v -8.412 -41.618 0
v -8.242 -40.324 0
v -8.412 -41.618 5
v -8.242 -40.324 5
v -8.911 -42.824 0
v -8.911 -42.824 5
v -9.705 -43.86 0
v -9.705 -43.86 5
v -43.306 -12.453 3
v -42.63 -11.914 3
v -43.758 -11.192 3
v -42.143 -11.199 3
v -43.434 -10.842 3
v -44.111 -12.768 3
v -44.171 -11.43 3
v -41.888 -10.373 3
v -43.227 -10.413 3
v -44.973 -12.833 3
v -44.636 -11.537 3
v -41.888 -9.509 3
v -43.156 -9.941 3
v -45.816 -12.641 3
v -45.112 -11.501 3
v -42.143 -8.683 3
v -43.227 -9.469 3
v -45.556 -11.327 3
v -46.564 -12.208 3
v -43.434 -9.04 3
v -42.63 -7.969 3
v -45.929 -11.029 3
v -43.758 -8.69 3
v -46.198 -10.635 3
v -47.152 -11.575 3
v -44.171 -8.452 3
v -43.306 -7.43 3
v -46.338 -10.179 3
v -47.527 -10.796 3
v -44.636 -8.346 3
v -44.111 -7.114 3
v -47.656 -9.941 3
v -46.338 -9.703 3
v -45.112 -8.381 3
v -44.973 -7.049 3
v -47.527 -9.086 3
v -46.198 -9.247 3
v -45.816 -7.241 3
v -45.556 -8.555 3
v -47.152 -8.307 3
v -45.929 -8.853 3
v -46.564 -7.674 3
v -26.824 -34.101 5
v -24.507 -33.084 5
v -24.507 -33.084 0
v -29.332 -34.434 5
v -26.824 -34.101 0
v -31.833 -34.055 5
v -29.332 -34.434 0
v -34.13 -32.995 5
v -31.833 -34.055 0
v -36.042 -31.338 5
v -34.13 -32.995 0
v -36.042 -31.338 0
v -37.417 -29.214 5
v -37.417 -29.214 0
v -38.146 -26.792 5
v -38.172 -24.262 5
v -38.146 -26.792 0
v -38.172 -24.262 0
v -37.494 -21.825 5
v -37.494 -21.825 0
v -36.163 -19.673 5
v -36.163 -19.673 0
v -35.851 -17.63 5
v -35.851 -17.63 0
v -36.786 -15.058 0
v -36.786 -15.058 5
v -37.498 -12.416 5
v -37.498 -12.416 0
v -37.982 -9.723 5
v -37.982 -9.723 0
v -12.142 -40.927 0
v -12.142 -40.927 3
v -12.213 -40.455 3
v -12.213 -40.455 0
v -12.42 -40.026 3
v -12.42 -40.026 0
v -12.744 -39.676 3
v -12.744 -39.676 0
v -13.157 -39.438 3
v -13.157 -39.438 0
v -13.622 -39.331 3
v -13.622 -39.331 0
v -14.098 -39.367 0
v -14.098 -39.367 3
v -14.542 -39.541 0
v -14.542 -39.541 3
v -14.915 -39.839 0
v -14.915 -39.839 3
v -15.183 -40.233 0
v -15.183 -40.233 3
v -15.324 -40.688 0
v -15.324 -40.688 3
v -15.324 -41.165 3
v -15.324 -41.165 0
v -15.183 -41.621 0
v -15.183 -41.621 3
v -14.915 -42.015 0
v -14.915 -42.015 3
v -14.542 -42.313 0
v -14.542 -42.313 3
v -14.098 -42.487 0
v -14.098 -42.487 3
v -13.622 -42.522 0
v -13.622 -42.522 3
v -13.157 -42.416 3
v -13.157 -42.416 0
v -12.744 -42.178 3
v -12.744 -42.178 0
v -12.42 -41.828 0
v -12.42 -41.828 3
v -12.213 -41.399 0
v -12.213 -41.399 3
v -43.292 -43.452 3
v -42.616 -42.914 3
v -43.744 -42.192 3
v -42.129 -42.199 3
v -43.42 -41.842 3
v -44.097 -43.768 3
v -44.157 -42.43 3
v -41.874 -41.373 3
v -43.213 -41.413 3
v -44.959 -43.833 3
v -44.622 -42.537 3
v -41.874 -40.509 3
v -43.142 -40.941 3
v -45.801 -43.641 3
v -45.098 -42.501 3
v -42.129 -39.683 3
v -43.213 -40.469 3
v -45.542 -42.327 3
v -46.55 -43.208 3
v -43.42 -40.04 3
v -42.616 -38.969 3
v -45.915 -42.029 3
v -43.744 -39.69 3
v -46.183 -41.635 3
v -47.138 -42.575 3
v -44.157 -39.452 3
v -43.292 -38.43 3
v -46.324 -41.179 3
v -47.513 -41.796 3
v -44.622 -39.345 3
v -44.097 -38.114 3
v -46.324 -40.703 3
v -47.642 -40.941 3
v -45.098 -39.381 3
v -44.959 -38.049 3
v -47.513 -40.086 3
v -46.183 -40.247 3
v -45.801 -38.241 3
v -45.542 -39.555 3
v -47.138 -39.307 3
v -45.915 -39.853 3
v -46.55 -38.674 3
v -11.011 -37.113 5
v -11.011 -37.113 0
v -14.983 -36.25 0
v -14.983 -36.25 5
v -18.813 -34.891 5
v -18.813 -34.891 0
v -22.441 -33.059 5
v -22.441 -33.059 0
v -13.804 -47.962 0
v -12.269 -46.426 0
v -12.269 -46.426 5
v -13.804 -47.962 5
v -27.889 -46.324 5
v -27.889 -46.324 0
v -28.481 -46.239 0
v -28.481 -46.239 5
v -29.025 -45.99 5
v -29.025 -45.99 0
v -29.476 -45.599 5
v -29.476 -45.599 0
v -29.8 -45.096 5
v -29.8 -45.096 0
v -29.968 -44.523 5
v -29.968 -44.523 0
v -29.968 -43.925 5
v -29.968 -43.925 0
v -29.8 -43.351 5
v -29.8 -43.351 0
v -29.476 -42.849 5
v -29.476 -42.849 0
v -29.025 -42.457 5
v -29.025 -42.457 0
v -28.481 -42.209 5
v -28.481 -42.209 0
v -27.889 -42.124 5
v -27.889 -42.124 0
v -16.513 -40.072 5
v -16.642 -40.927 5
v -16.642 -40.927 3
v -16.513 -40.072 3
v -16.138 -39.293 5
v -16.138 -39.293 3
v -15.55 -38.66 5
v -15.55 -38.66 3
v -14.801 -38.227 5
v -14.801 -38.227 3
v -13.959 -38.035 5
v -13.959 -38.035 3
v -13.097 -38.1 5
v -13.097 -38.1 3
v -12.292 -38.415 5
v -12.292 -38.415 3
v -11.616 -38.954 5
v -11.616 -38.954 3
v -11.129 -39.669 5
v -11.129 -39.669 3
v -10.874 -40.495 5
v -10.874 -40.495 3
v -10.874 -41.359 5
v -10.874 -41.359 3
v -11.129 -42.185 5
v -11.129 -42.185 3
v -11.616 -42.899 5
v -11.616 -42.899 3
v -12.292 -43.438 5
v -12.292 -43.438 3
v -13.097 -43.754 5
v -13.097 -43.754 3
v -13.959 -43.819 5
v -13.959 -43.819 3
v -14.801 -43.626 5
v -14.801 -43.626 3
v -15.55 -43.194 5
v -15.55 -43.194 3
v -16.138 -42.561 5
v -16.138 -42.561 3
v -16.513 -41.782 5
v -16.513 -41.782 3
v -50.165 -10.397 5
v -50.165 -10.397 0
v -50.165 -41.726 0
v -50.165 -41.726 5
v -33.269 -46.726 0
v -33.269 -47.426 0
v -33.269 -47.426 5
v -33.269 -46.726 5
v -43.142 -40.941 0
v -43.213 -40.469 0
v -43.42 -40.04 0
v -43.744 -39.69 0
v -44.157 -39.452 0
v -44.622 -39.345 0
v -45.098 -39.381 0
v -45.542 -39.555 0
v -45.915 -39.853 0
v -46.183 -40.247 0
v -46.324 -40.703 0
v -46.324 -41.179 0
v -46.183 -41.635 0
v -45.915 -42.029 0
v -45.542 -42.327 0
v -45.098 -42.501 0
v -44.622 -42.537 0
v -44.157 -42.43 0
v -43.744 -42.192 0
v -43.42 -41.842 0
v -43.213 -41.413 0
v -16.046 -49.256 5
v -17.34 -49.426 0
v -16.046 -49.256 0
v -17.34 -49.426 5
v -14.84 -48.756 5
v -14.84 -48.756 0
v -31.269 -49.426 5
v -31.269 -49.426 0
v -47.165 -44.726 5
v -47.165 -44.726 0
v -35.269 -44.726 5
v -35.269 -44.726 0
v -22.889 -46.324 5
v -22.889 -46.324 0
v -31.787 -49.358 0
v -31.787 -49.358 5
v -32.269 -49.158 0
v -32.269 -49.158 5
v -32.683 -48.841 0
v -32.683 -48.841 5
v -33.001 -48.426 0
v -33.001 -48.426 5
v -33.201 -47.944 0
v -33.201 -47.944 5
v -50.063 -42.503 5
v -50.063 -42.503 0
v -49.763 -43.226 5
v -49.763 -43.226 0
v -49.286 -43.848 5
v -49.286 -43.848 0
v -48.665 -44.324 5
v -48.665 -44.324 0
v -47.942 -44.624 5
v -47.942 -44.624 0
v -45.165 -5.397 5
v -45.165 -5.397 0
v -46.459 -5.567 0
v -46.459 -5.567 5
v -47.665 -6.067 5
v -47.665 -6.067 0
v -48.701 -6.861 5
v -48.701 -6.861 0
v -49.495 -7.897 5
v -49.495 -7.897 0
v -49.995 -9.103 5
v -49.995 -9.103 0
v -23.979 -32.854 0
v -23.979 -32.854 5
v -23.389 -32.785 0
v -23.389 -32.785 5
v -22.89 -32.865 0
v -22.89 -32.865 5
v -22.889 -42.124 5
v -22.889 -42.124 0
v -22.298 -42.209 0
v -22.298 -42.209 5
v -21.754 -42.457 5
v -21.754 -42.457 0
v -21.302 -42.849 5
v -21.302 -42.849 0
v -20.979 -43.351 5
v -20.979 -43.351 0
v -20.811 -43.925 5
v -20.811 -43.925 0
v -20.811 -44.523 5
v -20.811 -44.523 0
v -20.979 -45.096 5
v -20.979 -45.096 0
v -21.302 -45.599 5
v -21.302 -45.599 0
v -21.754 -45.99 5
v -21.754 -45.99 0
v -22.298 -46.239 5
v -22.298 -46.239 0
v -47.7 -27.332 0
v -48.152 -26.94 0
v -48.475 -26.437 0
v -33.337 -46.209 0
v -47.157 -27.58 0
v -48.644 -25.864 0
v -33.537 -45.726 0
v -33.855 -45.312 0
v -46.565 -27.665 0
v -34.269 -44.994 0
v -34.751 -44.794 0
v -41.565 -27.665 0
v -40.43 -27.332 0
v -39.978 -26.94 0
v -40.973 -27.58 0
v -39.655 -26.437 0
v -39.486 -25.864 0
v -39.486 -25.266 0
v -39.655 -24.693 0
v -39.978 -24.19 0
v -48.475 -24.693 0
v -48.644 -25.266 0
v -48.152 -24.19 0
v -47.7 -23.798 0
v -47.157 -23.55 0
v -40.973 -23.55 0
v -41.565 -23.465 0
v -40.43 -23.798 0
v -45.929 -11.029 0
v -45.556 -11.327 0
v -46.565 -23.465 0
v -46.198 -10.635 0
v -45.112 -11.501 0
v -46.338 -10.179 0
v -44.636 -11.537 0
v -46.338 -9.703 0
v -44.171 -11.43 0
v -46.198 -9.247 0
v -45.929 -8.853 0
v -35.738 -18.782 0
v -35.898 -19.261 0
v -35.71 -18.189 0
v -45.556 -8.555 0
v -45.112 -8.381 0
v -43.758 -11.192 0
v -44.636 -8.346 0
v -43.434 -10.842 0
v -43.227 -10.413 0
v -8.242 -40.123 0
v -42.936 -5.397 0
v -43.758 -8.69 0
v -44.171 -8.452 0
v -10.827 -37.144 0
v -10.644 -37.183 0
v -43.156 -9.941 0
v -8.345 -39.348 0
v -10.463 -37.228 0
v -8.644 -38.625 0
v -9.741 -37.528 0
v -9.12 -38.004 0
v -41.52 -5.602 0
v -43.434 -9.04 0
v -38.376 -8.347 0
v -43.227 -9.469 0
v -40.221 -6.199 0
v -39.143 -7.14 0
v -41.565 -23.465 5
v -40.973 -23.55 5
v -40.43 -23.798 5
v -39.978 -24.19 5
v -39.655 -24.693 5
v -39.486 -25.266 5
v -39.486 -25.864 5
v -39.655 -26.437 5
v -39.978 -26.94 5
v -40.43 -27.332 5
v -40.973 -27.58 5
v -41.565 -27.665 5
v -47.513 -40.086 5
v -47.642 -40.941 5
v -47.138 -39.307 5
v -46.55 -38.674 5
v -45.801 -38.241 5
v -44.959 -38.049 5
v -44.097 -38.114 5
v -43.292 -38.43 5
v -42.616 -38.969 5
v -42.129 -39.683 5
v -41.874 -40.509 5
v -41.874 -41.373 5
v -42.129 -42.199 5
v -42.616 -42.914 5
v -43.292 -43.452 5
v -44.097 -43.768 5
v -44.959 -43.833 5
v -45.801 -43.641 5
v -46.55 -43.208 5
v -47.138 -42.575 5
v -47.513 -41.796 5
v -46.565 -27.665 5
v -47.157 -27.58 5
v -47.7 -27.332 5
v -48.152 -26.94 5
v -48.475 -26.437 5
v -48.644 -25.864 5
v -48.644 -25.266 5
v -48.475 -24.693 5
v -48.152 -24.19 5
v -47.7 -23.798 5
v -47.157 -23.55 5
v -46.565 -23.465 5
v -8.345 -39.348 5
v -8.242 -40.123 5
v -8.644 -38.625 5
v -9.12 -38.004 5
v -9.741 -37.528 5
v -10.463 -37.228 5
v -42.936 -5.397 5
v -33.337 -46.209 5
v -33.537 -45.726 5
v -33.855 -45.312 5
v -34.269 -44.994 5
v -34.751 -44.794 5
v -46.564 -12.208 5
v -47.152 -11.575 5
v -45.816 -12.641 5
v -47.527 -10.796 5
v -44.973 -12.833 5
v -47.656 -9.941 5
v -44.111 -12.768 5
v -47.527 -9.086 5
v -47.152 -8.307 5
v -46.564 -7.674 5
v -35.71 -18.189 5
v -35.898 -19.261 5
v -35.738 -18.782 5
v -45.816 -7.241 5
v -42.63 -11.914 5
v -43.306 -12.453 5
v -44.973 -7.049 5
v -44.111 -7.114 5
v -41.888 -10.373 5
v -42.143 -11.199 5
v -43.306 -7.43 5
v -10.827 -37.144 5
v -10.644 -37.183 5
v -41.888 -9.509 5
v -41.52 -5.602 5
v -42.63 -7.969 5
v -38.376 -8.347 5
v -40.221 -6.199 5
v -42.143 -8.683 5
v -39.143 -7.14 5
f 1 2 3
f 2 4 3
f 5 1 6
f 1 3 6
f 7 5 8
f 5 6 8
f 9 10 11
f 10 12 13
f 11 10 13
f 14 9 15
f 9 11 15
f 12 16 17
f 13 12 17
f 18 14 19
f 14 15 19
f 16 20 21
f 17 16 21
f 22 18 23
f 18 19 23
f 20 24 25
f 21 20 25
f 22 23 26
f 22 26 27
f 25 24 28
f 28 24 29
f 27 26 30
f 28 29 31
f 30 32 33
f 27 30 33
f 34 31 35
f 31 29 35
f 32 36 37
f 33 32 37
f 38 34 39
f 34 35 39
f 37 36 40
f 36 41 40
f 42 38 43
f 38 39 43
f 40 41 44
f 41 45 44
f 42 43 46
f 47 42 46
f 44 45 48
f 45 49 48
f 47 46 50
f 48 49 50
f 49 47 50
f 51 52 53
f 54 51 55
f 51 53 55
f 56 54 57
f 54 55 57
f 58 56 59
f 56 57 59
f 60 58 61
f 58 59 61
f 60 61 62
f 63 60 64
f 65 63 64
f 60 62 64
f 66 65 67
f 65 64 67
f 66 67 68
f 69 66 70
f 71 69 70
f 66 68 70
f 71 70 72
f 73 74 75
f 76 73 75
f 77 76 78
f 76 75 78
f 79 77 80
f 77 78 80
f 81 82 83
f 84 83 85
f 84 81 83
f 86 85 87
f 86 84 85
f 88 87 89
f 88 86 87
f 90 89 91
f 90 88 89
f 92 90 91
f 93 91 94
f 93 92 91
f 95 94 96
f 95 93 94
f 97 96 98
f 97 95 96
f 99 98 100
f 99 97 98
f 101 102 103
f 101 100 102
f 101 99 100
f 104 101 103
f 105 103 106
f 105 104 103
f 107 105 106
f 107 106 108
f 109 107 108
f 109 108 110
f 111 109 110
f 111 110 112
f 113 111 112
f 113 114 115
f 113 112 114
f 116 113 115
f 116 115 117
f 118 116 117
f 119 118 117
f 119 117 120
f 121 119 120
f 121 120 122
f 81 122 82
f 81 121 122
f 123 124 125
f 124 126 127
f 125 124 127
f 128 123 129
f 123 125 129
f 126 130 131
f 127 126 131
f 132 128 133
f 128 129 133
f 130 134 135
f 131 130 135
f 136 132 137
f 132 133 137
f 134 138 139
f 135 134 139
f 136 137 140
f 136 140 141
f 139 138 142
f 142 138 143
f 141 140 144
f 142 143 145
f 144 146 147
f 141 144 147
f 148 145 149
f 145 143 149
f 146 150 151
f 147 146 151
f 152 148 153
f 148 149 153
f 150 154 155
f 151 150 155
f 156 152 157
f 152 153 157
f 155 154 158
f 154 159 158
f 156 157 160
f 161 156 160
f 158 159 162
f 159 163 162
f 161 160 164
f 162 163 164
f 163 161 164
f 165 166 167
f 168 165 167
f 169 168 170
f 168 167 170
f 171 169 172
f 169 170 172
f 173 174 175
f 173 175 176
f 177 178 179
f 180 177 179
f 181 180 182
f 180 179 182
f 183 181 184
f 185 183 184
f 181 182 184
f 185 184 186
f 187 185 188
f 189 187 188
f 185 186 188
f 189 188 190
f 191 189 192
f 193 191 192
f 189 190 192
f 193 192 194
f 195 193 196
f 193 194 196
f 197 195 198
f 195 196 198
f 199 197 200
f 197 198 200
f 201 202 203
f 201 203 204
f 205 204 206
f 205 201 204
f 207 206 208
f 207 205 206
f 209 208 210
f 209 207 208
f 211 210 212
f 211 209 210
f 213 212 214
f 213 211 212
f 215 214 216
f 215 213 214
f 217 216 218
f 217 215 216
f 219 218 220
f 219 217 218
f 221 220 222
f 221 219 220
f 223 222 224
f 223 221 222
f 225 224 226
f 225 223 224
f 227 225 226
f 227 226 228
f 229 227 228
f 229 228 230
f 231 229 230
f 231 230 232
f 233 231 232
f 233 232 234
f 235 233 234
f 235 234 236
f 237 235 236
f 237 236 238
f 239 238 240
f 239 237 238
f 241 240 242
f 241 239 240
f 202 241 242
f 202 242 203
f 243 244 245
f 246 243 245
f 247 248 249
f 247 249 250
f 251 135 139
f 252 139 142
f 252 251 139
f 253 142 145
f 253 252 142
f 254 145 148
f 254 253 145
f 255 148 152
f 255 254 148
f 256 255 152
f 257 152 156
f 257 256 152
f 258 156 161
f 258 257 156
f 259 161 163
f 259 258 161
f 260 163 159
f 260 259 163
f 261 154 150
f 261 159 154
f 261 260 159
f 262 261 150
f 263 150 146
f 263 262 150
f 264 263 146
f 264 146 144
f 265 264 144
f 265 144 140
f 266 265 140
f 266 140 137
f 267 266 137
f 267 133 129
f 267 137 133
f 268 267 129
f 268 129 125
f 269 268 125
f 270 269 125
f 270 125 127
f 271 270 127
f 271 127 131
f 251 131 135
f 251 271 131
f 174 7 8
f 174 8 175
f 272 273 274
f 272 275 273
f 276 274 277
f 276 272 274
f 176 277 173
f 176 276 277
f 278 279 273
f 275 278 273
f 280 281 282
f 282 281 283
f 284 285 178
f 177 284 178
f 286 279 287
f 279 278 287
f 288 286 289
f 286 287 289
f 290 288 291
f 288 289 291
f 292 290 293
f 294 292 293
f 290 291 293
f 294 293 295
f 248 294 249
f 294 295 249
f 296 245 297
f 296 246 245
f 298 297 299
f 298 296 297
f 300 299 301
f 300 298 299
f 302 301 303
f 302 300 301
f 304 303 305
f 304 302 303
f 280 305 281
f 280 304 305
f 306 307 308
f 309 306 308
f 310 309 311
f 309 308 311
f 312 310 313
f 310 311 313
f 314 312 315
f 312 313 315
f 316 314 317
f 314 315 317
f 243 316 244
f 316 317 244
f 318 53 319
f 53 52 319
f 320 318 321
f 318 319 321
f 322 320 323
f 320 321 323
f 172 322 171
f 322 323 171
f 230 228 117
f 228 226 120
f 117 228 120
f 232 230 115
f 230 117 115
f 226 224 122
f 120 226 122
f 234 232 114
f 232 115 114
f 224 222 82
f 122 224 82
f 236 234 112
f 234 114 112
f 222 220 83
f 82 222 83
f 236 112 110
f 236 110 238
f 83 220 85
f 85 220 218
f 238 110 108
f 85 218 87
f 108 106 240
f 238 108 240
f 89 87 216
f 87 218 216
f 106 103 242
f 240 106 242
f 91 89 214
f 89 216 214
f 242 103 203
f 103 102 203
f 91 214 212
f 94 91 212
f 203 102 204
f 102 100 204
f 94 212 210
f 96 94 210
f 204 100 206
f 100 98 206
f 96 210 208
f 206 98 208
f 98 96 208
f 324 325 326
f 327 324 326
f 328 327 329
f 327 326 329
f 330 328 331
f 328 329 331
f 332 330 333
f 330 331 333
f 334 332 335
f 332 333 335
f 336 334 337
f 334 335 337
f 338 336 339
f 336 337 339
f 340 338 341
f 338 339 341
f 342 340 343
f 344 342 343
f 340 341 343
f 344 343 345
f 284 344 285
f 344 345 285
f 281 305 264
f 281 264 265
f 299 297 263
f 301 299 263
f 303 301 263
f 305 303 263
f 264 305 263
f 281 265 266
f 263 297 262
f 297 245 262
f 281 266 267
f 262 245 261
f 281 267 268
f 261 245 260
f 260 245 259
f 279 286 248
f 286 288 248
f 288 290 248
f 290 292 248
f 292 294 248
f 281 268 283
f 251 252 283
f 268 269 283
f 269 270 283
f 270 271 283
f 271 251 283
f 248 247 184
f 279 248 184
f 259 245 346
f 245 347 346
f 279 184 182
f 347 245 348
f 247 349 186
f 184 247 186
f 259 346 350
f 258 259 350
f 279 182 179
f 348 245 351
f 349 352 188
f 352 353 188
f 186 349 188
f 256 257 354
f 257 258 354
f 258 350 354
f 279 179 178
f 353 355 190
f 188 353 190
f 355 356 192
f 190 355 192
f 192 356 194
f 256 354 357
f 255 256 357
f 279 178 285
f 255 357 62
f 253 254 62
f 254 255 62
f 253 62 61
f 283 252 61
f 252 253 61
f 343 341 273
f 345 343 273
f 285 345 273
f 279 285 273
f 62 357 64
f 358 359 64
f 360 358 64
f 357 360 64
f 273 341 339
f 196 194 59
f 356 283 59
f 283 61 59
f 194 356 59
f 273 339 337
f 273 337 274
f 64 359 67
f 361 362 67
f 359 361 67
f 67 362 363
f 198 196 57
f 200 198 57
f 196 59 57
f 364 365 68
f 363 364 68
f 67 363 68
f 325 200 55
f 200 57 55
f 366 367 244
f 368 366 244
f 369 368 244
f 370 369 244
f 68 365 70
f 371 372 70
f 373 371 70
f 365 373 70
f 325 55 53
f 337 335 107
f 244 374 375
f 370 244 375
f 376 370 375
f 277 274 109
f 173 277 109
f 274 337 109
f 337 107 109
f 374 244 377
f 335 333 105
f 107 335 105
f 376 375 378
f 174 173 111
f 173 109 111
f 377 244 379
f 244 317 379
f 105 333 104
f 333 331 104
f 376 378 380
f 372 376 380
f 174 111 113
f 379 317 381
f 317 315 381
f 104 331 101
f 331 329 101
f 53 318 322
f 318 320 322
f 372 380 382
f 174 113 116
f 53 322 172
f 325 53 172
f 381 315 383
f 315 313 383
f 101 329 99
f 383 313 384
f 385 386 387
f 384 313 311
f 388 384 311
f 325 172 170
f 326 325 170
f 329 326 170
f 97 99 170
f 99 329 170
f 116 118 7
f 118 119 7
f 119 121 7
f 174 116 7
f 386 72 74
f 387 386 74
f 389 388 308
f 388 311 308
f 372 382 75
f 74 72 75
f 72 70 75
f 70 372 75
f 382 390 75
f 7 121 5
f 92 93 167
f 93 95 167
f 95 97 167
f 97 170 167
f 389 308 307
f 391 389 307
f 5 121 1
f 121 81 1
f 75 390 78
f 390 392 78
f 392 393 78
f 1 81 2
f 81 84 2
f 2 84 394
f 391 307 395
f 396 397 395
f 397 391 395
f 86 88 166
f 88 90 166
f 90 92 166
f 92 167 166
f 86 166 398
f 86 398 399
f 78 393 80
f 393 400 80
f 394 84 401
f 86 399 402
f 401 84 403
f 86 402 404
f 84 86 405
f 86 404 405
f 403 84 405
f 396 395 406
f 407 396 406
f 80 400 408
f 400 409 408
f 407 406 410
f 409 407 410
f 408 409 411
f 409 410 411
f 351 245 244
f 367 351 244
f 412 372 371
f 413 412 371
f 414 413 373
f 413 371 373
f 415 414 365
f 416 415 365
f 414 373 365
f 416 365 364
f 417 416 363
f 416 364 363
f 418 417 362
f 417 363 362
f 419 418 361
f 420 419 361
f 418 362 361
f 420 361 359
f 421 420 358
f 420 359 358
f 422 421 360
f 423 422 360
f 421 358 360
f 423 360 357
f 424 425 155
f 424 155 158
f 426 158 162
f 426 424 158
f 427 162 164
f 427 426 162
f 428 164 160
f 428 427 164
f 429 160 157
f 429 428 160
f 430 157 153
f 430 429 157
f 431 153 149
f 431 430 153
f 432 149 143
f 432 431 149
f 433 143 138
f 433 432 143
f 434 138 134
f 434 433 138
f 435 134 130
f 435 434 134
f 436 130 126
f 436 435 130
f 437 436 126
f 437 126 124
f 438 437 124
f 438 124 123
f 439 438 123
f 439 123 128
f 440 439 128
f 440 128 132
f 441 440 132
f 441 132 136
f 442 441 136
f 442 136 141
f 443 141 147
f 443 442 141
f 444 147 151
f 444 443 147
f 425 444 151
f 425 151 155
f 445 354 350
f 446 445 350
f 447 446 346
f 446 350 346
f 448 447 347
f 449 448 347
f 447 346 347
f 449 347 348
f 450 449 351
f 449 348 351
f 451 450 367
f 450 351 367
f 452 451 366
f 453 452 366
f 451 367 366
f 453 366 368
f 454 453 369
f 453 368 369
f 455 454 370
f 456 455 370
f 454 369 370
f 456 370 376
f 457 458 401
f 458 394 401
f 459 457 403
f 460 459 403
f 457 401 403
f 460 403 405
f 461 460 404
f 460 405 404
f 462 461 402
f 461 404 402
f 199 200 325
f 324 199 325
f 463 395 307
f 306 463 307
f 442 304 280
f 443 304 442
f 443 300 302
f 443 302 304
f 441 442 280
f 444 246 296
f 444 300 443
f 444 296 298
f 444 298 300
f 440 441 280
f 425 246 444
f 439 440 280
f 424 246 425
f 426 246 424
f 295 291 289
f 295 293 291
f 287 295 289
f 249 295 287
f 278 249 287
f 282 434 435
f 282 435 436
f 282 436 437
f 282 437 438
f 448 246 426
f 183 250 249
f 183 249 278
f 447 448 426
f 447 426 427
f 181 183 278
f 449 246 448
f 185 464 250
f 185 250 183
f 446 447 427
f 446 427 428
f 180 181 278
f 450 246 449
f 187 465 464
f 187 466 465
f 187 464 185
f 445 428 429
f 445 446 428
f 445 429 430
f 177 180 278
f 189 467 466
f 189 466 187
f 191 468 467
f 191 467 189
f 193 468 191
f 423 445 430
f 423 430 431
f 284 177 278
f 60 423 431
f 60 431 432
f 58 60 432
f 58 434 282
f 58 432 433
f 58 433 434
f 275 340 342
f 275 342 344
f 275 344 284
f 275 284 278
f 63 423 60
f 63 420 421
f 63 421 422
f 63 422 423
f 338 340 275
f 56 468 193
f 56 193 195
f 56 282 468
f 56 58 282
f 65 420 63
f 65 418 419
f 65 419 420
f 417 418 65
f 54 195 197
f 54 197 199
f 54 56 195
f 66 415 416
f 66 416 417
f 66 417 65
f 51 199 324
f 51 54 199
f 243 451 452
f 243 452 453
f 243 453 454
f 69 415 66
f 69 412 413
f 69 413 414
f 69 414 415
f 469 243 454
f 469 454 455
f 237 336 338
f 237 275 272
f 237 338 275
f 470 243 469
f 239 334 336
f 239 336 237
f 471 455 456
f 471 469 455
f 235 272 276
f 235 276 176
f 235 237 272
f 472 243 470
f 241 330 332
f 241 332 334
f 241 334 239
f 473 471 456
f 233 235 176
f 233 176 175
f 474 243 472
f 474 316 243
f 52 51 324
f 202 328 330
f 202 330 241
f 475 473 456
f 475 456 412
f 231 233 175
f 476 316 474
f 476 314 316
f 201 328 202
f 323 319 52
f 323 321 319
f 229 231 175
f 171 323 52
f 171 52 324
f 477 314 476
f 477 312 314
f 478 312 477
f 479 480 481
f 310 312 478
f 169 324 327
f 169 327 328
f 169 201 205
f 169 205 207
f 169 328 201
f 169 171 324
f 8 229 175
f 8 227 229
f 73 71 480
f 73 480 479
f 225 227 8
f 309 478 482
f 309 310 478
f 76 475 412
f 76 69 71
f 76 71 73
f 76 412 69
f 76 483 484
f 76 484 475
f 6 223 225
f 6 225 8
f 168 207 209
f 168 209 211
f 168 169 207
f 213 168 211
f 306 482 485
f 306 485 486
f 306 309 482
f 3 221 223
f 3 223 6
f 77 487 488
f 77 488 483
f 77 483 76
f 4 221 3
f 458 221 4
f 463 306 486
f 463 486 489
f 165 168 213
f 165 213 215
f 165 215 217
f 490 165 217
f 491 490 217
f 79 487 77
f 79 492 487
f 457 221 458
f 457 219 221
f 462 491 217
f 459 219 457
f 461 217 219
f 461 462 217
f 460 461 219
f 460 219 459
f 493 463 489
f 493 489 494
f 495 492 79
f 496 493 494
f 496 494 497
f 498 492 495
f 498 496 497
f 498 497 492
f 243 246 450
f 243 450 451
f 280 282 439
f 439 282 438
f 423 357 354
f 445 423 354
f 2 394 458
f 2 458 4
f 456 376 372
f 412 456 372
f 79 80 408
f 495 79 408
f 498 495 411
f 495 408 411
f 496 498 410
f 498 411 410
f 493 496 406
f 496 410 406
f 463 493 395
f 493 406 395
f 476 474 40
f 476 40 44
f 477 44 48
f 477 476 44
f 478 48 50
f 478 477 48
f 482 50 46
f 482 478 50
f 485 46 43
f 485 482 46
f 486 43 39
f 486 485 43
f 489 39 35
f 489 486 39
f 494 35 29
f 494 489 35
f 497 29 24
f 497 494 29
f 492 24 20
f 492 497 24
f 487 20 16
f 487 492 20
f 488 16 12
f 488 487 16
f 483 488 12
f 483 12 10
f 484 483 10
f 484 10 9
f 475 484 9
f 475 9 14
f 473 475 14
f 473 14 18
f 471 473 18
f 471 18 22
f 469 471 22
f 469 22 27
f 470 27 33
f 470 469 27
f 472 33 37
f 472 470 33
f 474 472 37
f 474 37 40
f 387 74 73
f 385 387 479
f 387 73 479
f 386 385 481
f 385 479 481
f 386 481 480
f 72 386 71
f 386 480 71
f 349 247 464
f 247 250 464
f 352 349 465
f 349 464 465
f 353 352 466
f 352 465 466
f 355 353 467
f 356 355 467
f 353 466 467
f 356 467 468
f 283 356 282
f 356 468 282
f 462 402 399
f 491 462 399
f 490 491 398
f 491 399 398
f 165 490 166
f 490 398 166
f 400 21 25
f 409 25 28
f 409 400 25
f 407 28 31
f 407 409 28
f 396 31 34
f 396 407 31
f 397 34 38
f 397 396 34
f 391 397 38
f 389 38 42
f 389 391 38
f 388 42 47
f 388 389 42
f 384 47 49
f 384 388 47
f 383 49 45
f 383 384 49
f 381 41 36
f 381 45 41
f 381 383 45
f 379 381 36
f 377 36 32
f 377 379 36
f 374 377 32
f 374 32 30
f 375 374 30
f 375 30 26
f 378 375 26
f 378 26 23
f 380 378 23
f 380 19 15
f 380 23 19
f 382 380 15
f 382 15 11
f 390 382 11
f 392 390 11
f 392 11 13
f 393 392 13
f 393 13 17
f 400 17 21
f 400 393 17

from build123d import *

# Parameters (mm, degrees)
SKETCH_1_R          = 1.6
EXTRUDE_1_DEPTH     = 5
SKETCH_2_R          = 2.9
CUT_EXTRUDE_1_DEPTH = 2
CUT_EXTRUDE_3_DEPTH = 71.600960604
FILLET_1_R          = 5
FILLET_2_R          = 3
FILLET_4_R          = 2
FILLET_6_R          = 2
FILLET_7_R          = 2
FILLET_8_R          = 3


with BuildPart() as part:
    # 草图1 → 凸台-拉伸1 (new body)
    with BuildSketch(Plane.XY):
        with BuildLine():
            Line((-41.565100182, -49.426292213), (-39.485969284, -49.426292213))
            Line((-39.485969284, -49.426292213), (-13.65407564, -49.426292213))
            Line((-13.65407564, -49.426292213), (-11.764178943, -49.426292213))
            ThreePointArc((-11.764178943, -49.426292213), (-8.228645037, -47.961826119), (-6.764178943, -44.426292213))
            Line((-6.764178943, -44.426292213), (-6.764178943, -42.471801942))
            Line((-6.764178943, -42.471801942), (-6.761688654, -42.088770435))
            ThreePointArc((-6.761688654, -42.088770435), (-7.959392434, -38.809211433), (-11.011044569, -37.112915219))
            ThreePointArc((-11.011044569, -37.112915219), (-17.52195854, -35.410370983), (-23.534396799, -32.386921995))
            ThreePointArc((-23.534396799, -32.386921995), (-36.041802291, -31.338005667), (-35.33797784, -18.806443564))
            ThreePointArc((-35.33797784, -18.806443564), (-36.996722237, -14.362622261), (-37.982061376, -9.722785245))
            ThreePointArc((-37.982061376, -9.722785245), (-39.647864751, -6.630640555), (-42.936394307, -5.397014589))
            Line((-42.936394307, -5.397014589), (-45.165100182, -5.397014589))
            ThreePointArc((-45.165100182, -5.397014589), (-48.700634088, -6.861480683), (-50.165100182, -10.397014589))
            Line((-50.165100182, -10.397014589), (-50.165100182, -15.397014589))
            Line((-50.165100182, -15.397014589), (-50.165100182, -25.564927735))
            Line((-50.165100182, -25.564927735), (-50.165100182, -38.747161315))
            Line((-50.165100182, -38.747161315), (-50.165100182, -41.426292213))
            Line((-50.165100182, -41.426292213), (-50.165100182, -46.426292213))
            Line((-50.165100182, -46.426292213), (-45.165100182, -46.426292213))
            Line((-45.165100182, -46.426292213), (-41.565100182, -46.426292213))
            Line((-41.565100182, -46.426292213), (-41.565100182, -49.426292213))
        make_face()
        with Locations((-44.74192859, -40.941023834)):
            Circle(SKETCH_1_R, mode=Mode.SUBTRACT)
        with BuildLine():
            ThreePointArc((-27.889312547, -46.323727421), (-29.989312547, -44.223727421), (-27.889312547, -42.123727421))
            Line((-27.889312547, -42.123727421), (-22.889312547, -42.123727421))
            ThreePointArc((-22.889312547, -42.123727421), (-20.789312547, -44.223727421), (-22.889312547, -46.323727421))
            Line((-22.889312547, -46.323727421), (-27.889312547, -46.323727421))
        make_face(mode=Mode.SUBTRACT)
        with Locations((-13.741931799, -40.926918244)):
            Circle(SKETCH_1_R, mode=Mode.SUBTRACT)
        with BuildLine():
            ThreePointArc((-46.565100182, -27.664927735), (-48.665100182, -25.564927735), (-46.565100182, -23.464927735))
            Line((-46.565100182, -23.464927735), (-41.565100182, -23.464927735))
            ThreePointArc((-41.565100182, -23.464927735), (-39.465100182, -25.564927735), (-41.565100182, -27.664927735))
            Line((-41.565100182, -27.664927735), (-46.565100182, -27.664927735))
        make_face(mode=Mode.SUBTRACT)
        with Locations((-44.756034179, -9.941027044)):
            Circle(SKETCH_1_R, mode=Mode.SUBTRACT)
    extrude(amount=EXTRUDE_1_DEPTH)

    # 草图2 → 切除-拉伸1 (cut)
    with BuildSketch(Plane(origin=(0, 0, 5), x_dir=(-1, 0, 0), z_dir=(0, 0, -1))):
        with Locations((44.756034179, -9.941027044)):
            Circle(SKETCH_2_R)
        with Locations((44.74192859, -40.941023834)):
            Circle(SKETCH_2_R)
        with Locations((13.741931799, -40.926918244)):
            Circle(SKETCH_2_R)
    extrude(amount=CUT_EXTRUDE_1_DEPTH, mode=Mode.SUBTRACT)

    # 草图3 → 切除-拉伸3 (cut, through all)
    with BuildSketch(Plane(origin=(0, 0, 0), x_dir=(-1, 0, 0), z_dir=(0, 0, -1))):
        Polygon((8.241263234, -42.394978236), (12.268866598, -46.426248541), (15.268866287, -49.426292213), (33.268866287, -49.426292213), (33.268866287, -44.726292213), (48.610476999, -44.726292213), (50.241258886, -44.726292213), (50.241258886, -51.356689398), (5.002855071, -51.356689398), (5.002855071, -38.135185544), (8.243201521, -38.135185544), align=None)
    extrude(amount=-CUT_EXTRUDE_3_DEPTH, mode=Mode.SUBTRACT)

    # 圆角1
    fillet_1_edges = [part.edges().sort_by_distance(p)[0] for p in [
        (-8.241263234, -42.394978236, 2.5),
        (-15.268866287, -49.426292213, 2.5),
    ]]
    fillet(fillet_1_edges, radius=FILLET_1_R)

    # 圆角2
    fillet_2_edges = [part.edges().sort_by_distance(p)[0] for p in [
        (-8.243033782, -38.503826079, 2.5),
    ]]
    fillet(fillet_2_edges, radius=FILLET_2_R)

    # 圆角4
    fillet_4_edges = [part.edges().sort_by_distance(p)[0] for p in [
        (-33.268866287, -49.426292213, 2.5),
    ]]
    fillet(fillet_4_edges, radius=FILLET_4_R)

    # 圆角6
    fillet_6_edges = [part.edges().sort_by_distance(p)[0] for p in [
        (-33.268866287, -44.726292213, 2.5),
    ]]
    fillet(fillet_6_edges, radius=FILLET_6_R)

    # 圆角7
    fillet_7_edges = [part.edges().sort_by_distance(p)[0] for p in [
        (-23.534396799, -32.386921995, 2.5),
        (-35.33797784, -18.806443564, 2.5),
    ]]
    fillet(fillet_7_edges, radius=FILLET_7_R)

    # 圆角8
    fillet_8_edges = [part.edges().sort_by_distance(p)[0] for p in [
        (-50.165100182, -44.726292213, 2.5),
    ]]
    fillet(fillet_8_edges, radius=FILLET_8_R)


solid = part.part
